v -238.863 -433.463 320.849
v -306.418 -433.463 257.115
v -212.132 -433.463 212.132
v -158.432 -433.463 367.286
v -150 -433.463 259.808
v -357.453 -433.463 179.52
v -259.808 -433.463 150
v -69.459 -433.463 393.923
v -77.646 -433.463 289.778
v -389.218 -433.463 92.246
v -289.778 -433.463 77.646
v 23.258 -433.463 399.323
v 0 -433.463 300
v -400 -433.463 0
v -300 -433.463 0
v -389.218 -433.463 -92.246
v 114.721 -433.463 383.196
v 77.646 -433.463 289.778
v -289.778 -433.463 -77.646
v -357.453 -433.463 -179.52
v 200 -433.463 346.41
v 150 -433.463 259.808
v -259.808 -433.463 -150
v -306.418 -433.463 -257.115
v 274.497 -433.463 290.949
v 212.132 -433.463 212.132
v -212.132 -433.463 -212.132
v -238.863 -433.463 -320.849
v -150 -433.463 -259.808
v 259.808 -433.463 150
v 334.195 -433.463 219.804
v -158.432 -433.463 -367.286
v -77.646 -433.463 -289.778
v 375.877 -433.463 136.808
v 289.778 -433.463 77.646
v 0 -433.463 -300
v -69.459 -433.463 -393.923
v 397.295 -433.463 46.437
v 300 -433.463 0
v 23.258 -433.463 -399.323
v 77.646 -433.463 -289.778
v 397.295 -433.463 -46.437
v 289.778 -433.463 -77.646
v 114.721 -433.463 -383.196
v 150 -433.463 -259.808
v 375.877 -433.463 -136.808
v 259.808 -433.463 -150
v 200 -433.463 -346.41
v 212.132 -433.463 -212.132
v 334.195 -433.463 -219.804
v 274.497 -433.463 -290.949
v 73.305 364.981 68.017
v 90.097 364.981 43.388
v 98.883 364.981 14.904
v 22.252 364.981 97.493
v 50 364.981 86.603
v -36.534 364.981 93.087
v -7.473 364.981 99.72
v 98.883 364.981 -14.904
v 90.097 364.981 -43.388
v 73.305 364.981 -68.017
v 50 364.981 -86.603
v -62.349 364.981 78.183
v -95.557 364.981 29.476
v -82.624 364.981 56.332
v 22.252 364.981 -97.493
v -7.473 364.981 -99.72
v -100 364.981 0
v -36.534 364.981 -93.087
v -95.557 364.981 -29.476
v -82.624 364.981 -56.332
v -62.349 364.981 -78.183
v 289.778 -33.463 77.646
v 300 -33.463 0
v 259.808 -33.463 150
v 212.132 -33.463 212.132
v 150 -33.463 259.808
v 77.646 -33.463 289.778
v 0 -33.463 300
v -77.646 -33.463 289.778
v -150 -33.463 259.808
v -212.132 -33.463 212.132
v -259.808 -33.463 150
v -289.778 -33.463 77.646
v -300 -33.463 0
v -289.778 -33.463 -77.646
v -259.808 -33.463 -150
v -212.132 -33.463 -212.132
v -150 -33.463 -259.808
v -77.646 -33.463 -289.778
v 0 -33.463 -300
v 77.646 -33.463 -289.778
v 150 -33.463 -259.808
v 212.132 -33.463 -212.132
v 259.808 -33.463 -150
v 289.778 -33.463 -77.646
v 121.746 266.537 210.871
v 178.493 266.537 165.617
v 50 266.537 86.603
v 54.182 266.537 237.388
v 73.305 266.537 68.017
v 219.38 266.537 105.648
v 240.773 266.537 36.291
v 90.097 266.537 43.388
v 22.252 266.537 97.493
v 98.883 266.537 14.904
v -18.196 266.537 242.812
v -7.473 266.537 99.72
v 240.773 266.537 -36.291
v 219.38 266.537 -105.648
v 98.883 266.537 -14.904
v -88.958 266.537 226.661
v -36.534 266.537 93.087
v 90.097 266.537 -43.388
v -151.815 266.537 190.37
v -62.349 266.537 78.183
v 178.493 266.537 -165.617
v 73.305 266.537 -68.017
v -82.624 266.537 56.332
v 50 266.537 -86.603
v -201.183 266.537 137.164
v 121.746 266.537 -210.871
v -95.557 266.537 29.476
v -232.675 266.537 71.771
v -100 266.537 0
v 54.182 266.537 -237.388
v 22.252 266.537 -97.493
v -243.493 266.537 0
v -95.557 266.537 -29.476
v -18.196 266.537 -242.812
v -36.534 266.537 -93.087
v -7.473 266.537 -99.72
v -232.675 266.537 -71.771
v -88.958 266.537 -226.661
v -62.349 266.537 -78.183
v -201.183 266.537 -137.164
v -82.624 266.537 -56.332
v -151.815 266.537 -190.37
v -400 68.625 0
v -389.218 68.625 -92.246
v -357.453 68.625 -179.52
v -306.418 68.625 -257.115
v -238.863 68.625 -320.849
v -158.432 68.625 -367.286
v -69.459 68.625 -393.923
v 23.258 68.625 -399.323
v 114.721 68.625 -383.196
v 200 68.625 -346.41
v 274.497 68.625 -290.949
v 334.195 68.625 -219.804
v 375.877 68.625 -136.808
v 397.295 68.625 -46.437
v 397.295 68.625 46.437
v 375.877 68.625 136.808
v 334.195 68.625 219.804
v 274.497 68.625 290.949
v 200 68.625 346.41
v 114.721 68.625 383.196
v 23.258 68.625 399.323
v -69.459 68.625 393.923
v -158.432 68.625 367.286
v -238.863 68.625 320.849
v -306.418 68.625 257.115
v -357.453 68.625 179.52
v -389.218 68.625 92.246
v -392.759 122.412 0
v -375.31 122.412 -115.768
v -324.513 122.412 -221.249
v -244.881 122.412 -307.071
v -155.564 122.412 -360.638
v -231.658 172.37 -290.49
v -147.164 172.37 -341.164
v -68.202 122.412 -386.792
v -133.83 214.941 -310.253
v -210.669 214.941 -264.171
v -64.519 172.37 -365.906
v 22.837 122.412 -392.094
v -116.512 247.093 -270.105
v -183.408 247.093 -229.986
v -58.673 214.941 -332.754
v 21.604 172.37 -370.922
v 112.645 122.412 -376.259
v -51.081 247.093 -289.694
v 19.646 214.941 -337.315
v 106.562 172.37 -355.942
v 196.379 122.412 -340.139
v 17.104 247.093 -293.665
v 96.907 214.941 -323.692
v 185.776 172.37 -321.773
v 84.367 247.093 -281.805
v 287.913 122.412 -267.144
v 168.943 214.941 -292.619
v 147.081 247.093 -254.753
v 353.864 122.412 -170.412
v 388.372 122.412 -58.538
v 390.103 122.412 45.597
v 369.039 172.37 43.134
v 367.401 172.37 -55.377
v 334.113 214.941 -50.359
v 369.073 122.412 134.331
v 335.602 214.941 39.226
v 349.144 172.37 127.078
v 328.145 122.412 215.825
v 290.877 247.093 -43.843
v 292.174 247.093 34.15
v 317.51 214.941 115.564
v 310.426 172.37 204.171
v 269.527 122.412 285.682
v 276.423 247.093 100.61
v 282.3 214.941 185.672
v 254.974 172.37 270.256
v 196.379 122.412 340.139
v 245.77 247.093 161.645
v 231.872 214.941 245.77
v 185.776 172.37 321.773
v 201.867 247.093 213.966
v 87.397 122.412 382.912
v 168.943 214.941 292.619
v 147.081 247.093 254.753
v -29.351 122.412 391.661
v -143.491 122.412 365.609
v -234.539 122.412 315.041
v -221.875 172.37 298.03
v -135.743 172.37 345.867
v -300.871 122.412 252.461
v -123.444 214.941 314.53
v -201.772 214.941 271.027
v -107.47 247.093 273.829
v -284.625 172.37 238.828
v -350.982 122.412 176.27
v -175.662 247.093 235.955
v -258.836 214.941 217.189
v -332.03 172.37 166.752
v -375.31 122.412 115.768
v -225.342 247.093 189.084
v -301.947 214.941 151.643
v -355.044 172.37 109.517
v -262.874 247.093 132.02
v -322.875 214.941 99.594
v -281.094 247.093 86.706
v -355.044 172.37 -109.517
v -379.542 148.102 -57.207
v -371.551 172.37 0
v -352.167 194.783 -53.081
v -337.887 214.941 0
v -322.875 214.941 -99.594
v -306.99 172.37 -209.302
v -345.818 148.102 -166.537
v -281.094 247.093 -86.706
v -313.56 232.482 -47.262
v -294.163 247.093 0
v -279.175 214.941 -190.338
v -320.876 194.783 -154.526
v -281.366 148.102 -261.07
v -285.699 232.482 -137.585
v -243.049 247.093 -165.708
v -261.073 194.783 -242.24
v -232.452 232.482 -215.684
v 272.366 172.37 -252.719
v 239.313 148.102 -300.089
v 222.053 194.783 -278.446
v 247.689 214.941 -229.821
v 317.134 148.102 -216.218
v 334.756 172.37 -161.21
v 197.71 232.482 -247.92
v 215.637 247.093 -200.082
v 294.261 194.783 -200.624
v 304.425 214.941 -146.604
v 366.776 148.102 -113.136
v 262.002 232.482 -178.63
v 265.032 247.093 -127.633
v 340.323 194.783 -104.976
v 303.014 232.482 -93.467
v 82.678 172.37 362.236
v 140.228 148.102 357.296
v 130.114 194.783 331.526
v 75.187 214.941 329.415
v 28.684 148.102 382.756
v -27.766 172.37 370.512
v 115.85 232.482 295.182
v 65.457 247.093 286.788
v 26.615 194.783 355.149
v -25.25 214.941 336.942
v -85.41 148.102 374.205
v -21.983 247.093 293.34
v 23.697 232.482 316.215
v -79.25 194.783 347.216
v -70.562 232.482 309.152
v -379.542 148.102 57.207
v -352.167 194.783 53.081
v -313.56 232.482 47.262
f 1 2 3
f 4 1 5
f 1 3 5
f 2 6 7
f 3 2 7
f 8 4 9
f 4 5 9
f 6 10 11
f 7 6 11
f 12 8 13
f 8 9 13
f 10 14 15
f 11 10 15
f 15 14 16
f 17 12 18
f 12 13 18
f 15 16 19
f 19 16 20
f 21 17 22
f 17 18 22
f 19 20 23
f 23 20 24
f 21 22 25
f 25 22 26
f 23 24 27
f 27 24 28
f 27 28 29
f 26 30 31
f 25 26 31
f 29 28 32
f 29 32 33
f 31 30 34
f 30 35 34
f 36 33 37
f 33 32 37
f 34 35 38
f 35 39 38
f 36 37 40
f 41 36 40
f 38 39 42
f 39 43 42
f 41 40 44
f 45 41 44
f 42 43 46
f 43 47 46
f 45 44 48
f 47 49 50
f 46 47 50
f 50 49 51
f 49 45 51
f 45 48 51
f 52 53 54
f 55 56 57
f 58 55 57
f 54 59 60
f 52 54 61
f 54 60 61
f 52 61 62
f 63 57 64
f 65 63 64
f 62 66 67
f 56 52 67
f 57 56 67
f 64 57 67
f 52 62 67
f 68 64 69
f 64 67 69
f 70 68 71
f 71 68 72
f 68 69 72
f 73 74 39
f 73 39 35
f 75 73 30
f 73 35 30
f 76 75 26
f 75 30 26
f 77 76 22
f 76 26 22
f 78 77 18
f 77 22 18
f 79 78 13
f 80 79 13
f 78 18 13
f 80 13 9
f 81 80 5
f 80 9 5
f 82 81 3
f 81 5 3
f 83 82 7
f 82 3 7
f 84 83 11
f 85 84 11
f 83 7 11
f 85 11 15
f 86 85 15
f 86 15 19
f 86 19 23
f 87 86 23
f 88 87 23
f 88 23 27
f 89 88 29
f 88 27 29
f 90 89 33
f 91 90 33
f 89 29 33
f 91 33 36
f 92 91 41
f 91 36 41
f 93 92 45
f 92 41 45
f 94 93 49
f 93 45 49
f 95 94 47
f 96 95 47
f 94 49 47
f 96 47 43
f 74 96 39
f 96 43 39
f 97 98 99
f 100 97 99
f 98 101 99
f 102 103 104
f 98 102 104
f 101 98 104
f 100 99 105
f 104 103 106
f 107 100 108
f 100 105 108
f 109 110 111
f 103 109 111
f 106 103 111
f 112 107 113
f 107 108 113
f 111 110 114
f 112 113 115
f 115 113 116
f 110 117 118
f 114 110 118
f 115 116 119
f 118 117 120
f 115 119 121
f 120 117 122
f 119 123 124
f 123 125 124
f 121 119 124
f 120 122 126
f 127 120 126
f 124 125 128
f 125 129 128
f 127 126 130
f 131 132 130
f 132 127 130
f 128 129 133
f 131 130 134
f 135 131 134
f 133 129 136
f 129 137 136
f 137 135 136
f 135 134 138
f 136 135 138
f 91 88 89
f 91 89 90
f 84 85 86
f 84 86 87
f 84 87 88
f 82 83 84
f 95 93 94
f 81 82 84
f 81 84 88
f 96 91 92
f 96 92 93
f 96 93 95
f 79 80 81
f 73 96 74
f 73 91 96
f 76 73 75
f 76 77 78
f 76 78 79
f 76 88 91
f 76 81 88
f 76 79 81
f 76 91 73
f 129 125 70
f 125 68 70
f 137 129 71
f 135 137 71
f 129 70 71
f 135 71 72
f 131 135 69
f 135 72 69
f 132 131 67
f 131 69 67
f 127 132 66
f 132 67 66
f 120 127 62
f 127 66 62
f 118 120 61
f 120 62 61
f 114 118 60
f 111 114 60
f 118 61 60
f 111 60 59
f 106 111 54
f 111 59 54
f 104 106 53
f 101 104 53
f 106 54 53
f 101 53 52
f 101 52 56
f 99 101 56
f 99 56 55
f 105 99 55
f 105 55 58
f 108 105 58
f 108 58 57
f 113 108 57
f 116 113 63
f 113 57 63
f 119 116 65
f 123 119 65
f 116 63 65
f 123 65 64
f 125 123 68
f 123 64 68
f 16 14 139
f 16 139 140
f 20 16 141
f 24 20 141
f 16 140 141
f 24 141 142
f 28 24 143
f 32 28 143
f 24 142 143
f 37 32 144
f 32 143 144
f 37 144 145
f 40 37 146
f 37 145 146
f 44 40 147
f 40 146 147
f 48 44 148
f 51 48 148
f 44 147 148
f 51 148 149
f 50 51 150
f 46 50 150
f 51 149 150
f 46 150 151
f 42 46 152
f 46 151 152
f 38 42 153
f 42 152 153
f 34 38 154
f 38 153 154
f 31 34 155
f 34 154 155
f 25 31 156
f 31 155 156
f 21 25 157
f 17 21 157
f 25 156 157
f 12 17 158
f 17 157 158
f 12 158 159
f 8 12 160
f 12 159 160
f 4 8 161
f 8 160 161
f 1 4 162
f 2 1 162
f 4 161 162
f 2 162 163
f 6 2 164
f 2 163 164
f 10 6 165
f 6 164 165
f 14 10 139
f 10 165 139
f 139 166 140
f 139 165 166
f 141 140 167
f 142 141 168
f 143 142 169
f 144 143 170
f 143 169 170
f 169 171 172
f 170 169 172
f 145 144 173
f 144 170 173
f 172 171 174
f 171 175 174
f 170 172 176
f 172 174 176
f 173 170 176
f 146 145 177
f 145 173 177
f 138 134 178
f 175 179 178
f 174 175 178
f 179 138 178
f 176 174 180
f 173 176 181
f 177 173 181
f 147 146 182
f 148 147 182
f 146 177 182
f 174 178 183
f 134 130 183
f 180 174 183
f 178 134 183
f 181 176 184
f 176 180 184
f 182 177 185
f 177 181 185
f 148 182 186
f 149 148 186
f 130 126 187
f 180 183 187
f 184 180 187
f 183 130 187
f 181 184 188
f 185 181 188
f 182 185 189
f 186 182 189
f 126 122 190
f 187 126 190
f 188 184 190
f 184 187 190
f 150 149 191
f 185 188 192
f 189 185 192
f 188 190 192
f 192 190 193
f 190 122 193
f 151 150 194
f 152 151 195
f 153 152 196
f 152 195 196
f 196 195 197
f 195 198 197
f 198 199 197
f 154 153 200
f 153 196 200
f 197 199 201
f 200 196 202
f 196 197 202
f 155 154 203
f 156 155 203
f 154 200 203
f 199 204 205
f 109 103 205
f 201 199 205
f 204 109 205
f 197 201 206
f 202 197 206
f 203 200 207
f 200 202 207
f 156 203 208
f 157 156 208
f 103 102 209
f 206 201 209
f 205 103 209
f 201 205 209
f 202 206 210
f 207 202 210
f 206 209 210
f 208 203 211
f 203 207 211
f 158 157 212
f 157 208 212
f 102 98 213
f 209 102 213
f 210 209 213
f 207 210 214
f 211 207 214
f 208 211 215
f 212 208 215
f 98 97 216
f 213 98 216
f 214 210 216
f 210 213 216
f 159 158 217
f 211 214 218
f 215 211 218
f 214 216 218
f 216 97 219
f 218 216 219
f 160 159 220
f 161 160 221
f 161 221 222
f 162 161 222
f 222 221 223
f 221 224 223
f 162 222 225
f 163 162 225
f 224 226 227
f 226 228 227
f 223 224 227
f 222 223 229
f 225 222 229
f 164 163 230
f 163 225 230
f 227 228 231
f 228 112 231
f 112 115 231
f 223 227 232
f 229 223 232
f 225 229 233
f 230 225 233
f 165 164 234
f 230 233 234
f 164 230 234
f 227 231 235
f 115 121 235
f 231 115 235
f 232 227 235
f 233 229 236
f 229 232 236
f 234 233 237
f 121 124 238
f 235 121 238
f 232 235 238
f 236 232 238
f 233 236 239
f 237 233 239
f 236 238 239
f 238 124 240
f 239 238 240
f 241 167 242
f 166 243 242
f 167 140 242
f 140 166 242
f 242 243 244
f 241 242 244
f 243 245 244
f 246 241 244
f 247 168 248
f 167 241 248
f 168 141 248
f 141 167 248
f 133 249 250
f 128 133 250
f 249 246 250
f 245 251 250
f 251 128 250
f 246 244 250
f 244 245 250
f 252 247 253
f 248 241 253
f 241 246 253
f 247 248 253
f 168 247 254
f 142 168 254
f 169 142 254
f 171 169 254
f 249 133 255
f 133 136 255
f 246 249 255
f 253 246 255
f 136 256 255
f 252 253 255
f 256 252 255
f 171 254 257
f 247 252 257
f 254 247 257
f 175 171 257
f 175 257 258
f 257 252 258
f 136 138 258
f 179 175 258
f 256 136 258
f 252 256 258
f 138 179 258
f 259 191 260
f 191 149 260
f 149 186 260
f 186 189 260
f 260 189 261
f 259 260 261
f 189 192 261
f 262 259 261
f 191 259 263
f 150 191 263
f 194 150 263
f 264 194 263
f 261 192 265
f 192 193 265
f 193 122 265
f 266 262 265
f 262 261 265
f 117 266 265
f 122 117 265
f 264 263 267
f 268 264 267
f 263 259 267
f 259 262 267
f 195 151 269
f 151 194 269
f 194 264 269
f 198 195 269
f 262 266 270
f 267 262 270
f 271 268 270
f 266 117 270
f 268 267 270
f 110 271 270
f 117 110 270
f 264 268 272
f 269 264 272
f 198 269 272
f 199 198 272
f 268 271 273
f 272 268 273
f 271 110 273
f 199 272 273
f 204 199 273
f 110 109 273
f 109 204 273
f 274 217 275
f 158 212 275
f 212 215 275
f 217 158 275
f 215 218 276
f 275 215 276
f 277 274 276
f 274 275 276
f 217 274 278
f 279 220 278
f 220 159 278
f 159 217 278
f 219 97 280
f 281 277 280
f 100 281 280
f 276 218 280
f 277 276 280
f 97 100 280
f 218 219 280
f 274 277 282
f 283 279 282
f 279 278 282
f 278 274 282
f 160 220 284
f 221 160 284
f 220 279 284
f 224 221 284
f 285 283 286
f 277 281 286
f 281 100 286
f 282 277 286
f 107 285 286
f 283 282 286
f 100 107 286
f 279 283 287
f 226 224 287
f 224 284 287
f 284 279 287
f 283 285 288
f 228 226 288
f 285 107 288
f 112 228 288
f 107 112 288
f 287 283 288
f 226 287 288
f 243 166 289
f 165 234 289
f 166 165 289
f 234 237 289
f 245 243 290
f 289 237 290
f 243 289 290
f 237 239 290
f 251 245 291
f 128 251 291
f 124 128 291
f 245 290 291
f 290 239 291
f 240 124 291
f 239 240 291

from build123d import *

# Parameters (mm, degrees)
SKETCH3_R          = 300
CUT_EXTRUDE1_DEPTH = 400


with BuildPart() as part:
    # Sketch1 → Revolve2 (revolve)
    with BuildSketch(Plane.XY):
        with BuildLine():
            Line((0, 266.536964981), (0, -433.463035019))
            Line((0, -433.463035019), (-400, -433.463035019))
            Line((-400, -433.463035019), (-400, 68.62497771))
            ThreePointArc((-400, 68.62497771), (-356.145251984, 194.783226442), (-243.492938859, 266.536964981))
            Line((-243.492938859, 266.536964981), (-100, 266.536964981))
            Line((-100, 266.536964981), (-100, 364.980544747))
            Line((-100, 364.980544747), (0, 364.980544747))
            Line((0, 364.980544747), (0, 266.536964981))
        make_face()
    revolve(axis=Axis((0, 266.536964981, 0), (0, -1, 0)))

    # Sketch3 → Cut-Extrude1 (cut)
    with BuildSketch(Plane.XZ.offset(433.463035019)):
        Circle(SKETCH3_R)
    extrude(amount=-CUT_EXTRUDE1_DEPTH, mode=Mode.SUBTRACT)


solid = part.part
